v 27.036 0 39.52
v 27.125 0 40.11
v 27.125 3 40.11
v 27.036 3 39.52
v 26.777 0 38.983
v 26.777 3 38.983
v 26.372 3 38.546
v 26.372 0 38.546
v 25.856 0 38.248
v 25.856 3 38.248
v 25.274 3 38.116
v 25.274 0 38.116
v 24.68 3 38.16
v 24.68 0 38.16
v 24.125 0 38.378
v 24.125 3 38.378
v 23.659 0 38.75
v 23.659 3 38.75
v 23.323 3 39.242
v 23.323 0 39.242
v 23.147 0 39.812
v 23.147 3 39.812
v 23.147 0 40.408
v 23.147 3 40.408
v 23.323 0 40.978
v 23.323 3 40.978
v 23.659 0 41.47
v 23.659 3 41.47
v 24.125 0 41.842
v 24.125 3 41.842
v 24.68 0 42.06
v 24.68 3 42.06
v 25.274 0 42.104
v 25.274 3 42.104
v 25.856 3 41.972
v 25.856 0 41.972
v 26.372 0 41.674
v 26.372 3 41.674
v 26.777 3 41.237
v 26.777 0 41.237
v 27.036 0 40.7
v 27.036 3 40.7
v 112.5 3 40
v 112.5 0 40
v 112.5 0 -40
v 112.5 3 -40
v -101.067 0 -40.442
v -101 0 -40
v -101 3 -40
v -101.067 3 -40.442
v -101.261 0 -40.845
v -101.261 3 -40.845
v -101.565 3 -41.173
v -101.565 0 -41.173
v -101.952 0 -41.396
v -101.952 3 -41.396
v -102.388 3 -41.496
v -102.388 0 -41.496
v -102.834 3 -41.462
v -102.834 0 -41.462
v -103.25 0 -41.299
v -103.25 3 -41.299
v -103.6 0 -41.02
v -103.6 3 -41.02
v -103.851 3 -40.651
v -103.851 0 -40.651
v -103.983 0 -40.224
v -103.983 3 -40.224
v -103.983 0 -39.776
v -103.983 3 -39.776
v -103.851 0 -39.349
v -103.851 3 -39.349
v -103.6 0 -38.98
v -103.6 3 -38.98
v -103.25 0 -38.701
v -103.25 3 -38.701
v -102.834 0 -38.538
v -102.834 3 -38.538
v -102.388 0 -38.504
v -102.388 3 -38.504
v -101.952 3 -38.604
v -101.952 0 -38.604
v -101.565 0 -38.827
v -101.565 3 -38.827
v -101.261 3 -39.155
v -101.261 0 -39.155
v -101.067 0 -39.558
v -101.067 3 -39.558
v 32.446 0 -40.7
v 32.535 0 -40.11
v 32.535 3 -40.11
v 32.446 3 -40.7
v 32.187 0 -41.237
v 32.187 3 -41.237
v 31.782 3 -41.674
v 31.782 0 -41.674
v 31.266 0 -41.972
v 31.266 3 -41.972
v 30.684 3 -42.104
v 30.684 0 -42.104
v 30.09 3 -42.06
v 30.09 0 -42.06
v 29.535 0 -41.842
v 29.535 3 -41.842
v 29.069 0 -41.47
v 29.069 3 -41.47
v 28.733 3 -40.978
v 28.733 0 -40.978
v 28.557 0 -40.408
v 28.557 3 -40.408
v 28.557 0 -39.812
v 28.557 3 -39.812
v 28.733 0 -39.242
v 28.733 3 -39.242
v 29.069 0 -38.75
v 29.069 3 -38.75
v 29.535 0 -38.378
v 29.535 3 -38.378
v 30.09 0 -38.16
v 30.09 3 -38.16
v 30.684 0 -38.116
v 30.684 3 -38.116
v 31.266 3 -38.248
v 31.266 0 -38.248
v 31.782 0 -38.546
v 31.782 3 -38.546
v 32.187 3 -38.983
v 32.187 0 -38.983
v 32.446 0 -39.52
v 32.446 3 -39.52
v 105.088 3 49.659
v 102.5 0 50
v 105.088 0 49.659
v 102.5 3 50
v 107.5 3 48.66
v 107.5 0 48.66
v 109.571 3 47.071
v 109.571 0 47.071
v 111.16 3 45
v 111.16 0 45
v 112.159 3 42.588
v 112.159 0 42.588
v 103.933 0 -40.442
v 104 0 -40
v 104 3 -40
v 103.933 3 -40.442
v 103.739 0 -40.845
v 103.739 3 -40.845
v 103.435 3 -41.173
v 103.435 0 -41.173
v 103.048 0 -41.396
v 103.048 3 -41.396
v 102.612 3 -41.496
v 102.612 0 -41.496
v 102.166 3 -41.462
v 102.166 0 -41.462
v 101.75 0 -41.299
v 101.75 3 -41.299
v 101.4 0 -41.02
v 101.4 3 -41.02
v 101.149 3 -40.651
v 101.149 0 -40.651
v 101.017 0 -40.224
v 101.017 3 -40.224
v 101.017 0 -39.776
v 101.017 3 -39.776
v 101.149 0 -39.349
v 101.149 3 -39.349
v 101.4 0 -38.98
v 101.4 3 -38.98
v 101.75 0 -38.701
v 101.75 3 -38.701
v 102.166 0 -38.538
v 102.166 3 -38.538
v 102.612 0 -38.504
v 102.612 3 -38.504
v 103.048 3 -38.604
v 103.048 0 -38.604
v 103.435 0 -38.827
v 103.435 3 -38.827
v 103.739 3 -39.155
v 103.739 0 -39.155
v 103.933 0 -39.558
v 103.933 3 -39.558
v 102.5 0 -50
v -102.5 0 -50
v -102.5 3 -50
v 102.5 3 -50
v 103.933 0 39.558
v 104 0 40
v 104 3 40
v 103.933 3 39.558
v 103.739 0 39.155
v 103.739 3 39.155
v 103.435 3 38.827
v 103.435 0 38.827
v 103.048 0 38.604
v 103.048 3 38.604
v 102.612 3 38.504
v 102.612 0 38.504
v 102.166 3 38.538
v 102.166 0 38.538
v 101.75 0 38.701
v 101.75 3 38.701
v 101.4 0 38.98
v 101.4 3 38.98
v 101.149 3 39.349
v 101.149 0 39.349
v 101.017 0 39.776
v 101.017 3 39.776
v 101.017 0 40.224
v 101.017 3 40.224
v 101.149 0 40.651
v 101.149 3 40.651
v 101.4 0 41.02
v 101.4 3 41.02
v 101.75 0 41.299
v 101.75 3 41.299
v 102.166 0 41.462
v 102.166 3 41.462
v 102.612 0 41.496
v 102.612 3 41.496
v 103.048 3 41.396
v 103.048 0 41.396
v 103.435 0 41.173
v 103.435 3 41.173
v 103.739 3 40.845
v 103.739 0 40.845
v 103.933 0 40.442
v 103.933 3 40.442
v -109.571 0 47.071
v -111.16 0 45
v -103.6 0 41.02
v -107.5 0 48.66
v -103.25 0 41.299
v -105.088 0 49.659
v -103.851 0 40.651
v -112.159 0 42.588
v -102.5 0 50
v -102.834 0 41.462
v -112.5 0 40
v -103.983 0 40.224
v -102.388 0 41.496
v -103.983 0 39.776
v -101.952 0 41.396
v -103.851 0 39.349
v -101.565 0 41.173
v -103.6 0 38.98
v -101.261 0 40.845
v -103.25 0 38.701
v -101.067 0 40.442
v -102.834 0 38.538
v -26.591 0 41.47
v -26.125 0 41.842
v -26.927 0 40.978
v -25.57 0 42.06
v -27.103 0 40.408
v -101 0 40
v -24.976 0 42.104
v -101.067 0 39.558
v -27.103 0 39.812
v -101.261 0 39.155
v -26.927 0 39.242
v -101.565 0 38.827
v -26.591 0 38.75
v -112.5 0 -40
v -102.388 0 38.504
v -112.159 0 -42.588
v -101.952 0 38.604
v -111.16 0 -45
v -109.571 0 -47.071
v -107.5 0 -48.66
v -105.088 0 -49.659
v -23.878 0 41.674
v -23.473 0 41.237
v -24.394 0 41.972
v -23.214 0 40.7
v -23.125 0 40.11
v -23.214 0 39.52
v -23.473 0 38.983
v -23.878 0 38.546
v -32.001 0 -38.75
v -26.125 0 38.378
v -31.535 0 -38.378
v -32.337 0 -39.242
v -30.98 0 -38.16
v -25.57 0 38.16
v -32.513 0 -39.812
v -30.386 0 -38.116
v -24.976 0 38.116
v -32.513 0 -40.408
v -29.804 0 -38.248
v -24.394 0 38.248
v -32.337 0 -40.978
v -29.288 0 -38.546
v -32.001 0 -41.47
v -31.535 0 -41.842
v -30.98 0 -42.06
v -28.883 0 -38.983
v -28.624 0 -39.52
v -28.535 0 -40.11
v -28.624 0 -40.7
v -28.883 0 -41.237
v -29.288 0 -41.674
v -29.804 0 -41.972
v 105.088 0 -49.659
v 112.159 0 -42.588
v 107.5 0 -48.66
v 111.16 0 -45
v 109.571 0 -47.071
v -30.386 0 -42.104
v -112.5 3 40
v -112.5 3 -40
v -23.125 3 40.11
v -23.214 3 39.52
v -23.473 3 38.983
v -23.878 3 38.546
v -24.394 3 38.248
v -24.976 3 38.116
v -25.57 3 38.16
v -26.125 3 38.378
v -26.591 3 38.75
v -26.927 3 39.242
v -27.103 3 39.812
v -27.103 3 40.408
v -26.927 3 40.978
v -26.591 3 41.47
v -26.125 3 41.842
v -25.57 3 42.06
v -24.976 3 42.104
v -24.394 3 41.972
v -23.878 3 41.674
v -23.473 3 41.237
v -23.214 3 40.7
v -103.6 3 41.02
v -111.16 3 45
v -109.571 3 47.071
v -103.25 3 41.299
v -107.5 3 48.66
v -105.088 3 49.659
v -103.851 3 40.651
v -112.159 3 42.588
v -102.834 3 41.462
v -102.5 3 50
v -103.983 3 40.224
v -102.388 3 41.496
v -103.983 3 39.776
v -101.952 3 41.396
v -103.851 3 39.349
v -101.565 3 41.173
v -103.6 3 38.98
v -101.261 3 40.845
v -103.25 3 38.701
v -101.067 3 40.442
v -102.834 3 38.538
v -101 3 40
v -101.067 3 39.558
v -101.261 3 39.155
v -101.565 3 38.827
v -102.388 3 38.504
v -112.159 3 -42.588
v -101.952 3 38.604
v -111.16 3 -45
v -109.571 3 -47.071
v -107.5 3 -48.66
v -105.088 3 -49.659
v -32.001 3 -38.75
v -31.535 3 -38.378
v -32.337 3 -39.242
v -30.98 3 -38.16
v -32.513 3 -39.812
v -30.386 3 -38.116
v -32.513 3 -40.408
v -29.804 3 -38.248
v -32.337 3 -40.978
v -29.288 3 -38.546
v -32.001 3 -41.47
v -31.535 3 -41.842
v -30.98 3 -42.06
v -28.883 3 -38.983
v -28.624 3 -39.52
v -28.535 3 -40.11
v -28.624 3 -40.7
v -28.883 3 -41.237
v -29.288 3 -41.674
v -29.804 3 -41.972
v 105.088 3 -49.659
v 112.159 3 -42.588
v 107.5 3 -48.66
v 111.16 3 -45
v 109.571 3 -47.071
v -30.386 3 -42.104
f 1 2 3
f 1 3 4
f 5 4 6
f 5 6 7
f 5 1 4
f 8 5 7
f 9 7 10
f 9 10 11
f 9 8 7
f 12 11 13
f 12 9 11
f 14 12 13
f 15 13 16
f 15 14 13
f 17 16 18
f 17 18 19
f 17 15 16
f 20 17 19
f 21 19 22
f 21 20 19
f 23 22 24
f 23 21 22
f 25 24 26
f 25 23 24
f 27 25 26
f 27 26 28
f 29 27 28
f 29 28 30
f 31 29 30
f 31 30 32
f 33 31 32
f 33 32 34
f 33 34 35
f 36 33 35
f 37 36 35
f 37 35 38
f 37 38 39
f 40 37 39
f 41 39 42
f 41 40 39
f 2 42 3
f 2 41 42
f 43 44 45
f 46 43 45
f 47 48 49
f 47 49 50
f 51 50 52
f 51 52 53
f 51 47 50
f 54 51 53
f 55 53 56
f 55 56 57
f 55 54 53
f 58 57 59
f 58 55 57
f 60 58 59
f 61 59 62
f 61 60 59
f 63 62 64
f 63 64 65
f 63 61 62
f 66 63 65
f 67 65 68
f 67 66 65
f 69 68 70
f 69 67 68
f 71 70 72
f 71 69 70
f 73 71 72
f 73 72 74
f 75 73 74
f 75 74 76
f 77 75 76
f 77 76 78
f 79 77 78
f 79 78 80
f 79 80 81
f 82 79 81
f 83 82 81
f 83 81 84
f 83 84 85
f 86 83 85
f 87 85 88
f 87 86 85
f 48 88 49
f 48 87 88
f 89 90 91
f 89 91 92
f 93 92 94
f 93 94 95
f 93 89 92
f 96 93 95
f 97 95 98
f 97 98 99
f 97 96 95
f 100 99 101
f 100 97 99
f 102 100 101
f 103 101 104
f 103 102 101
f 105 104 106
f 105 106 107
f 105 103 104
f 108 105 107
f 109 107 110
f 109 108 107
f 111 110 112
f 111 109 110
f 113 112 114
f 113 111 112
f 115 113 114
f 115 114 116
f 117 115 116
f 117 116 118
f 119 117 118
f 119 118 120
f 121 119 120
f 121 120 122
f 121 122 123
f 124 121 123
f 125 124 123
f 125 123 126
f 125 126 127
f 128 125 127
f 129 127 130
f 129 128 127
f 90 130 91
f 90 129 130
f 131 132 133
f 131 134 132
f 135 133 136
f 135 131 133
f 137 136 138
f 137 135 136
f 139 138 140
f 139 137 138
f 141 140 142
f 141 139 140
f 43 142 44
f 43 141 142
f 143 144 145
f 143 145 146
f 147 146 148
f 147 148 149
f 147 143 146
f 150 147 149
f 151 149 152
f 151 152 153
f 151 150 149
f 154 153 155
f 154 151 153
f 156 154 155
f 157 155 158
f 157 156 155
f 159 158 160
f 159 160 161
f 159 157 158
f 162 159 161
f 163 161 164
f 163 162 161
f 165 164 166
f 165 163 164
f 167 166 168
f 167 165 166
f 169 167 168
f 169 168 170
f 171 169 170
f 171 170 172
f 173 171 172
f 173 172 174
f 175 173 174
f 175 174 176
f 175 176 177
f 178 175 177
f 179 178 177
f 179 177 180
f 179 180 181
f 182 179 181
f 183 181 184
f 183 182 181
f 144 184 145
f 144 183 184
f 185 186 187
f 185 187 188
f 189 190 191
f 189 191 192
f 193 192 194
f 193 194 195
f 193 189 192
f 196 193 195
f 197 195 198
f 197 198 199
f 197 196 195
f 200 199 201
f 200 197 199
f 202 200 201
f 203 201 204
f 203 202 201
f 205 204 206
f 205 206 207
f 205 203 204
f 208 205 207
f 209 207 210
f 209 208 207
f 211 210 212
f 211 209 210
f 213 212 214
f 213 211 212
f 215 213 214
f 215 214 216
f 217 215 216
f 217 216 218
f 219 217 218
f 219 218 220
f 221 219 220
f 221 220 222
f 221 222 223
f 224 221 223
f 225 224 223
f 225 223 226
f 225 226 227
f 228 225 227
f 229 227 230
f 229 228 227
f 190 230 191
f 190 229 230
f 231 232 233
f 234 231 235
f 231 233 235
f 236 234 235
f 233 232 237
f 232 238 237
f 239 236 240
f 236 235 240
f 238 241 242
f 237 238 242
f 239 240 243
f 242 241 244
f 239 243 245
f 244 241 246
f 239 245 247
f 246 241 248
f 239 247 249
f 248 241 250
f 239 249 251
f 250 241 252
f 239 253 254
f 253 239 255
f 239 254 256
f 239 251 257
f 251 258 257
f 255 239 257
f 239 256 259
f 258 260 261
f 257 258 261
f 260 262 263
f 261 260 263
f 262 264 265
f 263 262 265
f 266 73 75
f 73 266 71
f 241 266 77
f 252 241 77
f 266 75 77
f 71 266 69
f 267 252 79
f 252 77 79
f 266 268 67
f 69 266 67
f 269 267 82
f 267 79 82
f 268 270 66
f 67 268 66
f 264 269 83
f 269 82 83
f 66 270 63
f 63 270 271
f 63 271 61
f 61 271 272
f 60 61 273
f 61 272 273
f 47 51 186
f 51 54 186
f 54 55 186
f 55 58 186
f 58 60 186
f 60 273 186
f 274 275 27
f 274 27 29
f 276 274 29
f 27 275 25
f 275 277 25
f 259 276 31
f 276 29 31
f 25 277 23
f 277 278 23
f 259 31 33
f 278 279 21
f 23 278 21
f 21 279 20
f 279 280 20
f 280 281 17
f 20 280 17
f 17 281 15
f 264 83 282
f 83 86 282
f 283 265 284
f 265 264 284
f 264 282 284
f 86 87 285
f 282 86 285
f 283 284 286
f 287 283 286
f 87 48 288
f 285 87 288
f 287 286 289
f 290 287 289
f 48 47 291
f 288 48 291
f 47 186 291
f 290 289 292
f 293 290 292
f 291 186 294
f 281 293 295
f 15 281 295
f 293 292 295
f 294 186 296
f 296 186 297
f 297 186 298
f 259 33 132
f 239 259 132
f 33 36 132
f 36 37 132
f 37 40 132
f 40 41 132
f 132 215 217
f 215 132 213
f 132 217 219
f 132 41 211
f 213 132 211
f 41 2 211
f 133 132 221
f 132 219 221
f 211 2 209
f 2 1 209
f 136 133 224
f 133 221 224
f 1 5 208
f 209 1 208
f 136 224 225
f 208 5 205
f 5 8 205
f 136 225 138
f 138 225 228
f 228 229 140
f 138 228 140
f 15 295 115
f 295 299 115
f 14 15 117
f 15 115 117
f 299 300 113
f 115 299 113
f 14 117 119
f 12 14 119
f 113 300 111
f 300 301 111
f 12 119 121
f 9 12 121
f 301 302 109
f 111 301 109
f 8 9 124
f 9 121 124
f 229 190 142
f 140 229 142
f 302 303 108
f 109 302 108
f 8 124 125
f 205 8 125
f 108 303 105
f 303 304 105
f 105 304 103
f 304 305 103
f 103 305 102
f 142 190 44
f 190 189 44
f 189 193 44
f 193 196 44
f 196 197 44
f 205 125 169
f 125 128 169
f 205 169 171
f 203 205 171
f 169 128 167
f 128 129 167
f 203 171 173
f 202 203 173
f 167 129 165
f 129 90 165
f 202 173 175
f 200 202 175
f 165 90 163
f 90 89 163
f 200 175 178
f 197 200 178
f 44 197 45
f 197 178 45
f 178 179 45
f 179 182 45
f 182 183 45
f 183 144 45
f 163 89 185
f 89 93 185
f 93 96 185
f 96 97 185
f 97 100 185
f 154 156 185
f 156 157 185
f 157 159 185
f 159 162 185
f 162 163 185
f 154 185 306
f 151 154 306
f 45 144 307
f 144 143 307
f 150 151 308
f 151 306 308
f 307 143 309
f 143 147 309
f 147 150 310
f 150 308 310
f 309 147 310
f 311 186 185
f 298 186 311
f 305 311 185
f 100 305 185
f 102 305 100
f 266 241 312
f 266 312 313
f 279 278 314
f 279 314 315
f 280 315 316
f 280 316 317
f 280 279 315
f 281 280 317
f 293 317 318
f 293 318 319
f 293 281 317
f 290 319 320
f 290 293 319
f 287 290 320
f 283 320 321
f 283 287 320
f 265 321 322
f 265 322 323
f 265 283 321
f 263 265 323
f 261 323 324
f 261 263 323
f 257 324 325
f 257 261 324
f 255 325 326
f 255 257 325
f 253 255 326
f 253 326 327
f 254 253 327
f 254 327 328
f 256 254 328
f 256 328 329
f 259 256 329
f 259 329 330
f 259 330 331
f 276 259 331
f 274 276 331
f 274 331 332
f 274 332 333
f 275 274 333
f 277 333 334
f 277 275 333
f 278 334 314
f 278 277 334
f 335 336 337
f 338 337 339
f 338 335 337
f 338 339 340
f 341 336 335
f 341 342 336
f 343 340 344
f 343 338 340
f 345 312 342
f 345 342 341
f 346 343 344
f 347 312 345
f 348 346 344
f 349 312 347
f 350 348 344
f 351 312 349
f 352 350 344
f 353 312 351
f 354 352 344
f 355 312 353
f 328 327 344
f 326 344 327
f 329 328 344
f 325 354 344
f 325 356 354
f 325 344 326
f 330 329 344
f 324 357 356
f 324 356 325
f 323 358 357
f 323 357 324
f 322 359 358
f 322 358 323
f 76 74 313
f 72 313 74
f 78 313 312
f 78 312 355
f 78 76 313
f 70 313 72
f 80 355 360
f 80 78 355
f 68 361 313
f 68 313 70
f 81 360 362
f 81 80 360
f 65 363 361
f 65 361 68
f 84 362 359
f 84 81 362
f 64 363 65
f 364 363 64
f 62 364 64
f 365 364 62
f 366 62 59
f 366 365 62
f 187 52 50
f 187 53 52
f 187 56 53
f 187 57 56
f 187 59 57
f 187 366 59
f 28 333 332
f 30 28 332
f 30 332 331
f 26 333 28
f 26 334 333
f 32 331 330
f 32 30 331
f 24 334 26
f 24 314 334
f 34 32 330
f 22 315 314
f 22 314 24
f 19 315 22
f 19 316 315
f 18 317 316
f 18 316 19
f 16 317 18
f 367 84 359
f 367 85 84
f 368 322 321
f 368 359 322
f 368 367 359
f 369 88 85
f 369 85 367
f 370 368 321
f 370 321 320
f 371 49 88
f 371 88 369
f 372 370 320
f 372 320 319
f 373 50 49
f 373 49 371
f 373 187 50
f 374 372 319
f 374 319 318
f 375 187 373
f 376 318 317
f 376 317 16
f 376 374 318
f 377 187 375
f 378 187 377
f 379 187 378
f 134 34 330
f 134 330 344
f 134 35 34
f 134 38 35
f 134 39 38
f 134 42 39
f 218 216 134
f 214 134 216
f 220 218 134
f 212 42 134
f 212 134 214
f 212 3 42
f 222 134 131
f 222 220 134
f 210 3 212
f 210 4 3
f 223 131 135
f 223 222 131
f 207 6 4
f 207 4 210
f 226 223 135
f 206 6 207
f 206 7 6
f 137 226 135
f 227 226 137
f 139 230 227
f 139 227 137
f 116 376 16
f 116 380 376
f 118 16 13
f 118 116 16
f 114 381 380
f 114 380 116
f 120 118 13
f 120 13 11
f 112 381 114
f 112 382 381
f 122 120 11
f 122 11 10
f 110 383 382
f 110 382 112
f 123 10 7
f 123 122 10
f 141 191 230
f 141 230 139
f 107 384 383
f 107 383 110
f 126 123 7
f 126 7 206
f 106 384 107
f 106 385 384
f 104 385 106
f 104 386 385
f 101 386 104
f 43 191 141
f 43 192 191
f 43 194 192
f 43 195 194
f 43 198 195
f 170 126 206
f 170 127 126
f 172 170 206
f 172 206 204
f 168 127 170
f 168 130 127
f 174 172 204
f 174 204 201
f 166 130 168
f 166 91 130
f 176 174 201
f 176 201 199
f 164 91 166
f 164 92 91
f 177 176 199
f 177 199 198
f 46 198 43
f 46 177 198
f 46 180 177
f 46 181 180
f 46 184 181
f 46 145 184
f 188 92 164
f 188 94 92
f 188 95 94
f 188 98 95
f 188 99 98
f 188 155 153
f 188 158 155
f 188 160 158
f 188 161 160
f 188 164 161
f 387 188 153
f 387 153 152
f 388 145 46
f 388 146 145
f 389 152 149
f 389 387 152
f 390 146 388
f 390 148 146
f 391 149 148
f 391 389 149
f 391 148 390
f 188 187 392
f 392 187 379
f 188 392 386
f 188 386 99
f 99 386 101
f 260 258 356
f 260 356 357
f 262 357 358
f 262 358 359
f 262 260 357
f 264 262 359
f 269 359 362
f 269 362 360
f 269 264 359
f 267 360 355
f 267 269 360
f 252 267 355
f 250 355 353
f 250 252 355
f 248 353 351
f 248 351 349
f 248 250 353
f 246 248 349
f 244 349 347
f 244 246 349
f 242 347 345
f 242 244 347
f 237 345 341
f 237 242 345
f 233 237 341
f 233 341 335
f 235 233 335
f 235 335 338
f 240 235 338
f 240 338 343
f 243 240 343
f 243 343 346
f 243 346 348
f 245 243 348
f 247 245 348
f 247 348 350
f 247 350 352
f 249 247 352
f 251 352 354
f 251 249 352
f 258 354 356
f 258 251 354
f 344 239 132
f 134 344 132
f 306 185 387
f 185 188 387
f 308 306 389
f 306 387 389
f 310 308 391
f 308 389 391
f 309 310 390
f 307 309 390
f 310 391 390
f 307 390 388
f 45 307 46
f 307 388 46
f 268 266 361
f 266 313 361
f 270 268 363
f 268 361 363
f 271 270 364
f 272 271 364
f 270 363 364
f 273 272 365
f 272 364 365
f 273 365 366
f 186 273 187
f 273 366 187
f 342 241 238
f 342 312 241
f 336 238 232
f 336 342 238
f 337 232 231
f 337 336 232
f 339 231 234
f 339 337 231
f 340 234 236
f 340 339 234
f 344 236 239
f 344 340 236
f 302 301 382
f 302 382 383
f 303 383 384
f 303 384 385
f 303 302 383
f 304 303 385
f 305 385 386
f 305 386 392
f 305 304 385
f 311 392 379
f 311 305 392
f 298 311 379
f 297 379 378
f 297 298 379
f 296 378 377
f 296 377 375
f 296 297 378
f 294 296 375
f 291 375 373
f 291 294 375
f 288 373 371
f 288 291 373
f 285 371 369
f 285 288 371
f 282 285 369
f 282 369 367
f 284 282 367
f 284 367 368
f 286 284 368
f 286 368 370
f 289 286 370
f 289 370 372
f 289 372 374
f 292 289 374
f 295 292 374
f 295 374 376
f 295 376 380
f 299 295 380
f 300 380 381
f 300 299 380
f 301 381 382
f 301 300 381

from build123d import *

# Parameters (mm, degrees)
SKETCH1_W           = 225
SKETCH1_H           = 100
SKETCH1_R           = 1.5
SKETCH1_R_2         = 2
BOSS_EXTRUDE1_DEPTH = 3
FILLET1_R           = 10


with BuildPart() as part:
    # Sketch1 → Boss-Extrude1 (new body)
    with BuildSketch(Plane(origin=(0, 0, 0), x_dir=(1, 0, 0), z_dir=(0, 1, 0))):
        Rectangle(SKETCH1_W, SKETCH1_H)
        with Locations((-102.5, 40)):
            Circle(SKETCH1_R, mode=Mode.SUBTRACT)
        with Locations((102.5, 40)):
            Circle(SKETCH1_R, mode=Mode.SUBTRACT)
        with Locations((-102.5, -40)):
            Circle(SKETCH1_R, mode=Mode.SUBTRACT)
        with Locations((102.5, -40)):
            Circle(SKETCH1_R, mode=Mode.SUBTRACT)
        with Locations((-30.535, 40.11)):
            Circle(SKETCH1_R_2, mode=Mode.SUBTRACT)
        with Locations((30.535, 40.11)):
            Circle(SKETCH1_R_2, mode=Mode.SUBTRACT)
        with Locations((25.125, -40.11)):
            Circle(SKETCH1_R_2, mode=Mode.SUBTRACT)
        with Locations((-25.125, -40.11)):
            Circle(SKETCH1_R_2, mode=Mode.SUBTRACT)
    extrude(amount=BOSS_EXTRUDE1_DEPTH)

    # Fillet1
    fillet1_edges = [part.edges().sort_by_distance(p)[0] for p in [
        (112.5, 1.5, 50),
        (-112.5, 1.5, 50),
        (-112.5, 1.5, -50),
        (112.5, 1.5, -50),
    ]]
    fillet(fillet1_edges, radius=FILLET1_R)


solid = part.part
